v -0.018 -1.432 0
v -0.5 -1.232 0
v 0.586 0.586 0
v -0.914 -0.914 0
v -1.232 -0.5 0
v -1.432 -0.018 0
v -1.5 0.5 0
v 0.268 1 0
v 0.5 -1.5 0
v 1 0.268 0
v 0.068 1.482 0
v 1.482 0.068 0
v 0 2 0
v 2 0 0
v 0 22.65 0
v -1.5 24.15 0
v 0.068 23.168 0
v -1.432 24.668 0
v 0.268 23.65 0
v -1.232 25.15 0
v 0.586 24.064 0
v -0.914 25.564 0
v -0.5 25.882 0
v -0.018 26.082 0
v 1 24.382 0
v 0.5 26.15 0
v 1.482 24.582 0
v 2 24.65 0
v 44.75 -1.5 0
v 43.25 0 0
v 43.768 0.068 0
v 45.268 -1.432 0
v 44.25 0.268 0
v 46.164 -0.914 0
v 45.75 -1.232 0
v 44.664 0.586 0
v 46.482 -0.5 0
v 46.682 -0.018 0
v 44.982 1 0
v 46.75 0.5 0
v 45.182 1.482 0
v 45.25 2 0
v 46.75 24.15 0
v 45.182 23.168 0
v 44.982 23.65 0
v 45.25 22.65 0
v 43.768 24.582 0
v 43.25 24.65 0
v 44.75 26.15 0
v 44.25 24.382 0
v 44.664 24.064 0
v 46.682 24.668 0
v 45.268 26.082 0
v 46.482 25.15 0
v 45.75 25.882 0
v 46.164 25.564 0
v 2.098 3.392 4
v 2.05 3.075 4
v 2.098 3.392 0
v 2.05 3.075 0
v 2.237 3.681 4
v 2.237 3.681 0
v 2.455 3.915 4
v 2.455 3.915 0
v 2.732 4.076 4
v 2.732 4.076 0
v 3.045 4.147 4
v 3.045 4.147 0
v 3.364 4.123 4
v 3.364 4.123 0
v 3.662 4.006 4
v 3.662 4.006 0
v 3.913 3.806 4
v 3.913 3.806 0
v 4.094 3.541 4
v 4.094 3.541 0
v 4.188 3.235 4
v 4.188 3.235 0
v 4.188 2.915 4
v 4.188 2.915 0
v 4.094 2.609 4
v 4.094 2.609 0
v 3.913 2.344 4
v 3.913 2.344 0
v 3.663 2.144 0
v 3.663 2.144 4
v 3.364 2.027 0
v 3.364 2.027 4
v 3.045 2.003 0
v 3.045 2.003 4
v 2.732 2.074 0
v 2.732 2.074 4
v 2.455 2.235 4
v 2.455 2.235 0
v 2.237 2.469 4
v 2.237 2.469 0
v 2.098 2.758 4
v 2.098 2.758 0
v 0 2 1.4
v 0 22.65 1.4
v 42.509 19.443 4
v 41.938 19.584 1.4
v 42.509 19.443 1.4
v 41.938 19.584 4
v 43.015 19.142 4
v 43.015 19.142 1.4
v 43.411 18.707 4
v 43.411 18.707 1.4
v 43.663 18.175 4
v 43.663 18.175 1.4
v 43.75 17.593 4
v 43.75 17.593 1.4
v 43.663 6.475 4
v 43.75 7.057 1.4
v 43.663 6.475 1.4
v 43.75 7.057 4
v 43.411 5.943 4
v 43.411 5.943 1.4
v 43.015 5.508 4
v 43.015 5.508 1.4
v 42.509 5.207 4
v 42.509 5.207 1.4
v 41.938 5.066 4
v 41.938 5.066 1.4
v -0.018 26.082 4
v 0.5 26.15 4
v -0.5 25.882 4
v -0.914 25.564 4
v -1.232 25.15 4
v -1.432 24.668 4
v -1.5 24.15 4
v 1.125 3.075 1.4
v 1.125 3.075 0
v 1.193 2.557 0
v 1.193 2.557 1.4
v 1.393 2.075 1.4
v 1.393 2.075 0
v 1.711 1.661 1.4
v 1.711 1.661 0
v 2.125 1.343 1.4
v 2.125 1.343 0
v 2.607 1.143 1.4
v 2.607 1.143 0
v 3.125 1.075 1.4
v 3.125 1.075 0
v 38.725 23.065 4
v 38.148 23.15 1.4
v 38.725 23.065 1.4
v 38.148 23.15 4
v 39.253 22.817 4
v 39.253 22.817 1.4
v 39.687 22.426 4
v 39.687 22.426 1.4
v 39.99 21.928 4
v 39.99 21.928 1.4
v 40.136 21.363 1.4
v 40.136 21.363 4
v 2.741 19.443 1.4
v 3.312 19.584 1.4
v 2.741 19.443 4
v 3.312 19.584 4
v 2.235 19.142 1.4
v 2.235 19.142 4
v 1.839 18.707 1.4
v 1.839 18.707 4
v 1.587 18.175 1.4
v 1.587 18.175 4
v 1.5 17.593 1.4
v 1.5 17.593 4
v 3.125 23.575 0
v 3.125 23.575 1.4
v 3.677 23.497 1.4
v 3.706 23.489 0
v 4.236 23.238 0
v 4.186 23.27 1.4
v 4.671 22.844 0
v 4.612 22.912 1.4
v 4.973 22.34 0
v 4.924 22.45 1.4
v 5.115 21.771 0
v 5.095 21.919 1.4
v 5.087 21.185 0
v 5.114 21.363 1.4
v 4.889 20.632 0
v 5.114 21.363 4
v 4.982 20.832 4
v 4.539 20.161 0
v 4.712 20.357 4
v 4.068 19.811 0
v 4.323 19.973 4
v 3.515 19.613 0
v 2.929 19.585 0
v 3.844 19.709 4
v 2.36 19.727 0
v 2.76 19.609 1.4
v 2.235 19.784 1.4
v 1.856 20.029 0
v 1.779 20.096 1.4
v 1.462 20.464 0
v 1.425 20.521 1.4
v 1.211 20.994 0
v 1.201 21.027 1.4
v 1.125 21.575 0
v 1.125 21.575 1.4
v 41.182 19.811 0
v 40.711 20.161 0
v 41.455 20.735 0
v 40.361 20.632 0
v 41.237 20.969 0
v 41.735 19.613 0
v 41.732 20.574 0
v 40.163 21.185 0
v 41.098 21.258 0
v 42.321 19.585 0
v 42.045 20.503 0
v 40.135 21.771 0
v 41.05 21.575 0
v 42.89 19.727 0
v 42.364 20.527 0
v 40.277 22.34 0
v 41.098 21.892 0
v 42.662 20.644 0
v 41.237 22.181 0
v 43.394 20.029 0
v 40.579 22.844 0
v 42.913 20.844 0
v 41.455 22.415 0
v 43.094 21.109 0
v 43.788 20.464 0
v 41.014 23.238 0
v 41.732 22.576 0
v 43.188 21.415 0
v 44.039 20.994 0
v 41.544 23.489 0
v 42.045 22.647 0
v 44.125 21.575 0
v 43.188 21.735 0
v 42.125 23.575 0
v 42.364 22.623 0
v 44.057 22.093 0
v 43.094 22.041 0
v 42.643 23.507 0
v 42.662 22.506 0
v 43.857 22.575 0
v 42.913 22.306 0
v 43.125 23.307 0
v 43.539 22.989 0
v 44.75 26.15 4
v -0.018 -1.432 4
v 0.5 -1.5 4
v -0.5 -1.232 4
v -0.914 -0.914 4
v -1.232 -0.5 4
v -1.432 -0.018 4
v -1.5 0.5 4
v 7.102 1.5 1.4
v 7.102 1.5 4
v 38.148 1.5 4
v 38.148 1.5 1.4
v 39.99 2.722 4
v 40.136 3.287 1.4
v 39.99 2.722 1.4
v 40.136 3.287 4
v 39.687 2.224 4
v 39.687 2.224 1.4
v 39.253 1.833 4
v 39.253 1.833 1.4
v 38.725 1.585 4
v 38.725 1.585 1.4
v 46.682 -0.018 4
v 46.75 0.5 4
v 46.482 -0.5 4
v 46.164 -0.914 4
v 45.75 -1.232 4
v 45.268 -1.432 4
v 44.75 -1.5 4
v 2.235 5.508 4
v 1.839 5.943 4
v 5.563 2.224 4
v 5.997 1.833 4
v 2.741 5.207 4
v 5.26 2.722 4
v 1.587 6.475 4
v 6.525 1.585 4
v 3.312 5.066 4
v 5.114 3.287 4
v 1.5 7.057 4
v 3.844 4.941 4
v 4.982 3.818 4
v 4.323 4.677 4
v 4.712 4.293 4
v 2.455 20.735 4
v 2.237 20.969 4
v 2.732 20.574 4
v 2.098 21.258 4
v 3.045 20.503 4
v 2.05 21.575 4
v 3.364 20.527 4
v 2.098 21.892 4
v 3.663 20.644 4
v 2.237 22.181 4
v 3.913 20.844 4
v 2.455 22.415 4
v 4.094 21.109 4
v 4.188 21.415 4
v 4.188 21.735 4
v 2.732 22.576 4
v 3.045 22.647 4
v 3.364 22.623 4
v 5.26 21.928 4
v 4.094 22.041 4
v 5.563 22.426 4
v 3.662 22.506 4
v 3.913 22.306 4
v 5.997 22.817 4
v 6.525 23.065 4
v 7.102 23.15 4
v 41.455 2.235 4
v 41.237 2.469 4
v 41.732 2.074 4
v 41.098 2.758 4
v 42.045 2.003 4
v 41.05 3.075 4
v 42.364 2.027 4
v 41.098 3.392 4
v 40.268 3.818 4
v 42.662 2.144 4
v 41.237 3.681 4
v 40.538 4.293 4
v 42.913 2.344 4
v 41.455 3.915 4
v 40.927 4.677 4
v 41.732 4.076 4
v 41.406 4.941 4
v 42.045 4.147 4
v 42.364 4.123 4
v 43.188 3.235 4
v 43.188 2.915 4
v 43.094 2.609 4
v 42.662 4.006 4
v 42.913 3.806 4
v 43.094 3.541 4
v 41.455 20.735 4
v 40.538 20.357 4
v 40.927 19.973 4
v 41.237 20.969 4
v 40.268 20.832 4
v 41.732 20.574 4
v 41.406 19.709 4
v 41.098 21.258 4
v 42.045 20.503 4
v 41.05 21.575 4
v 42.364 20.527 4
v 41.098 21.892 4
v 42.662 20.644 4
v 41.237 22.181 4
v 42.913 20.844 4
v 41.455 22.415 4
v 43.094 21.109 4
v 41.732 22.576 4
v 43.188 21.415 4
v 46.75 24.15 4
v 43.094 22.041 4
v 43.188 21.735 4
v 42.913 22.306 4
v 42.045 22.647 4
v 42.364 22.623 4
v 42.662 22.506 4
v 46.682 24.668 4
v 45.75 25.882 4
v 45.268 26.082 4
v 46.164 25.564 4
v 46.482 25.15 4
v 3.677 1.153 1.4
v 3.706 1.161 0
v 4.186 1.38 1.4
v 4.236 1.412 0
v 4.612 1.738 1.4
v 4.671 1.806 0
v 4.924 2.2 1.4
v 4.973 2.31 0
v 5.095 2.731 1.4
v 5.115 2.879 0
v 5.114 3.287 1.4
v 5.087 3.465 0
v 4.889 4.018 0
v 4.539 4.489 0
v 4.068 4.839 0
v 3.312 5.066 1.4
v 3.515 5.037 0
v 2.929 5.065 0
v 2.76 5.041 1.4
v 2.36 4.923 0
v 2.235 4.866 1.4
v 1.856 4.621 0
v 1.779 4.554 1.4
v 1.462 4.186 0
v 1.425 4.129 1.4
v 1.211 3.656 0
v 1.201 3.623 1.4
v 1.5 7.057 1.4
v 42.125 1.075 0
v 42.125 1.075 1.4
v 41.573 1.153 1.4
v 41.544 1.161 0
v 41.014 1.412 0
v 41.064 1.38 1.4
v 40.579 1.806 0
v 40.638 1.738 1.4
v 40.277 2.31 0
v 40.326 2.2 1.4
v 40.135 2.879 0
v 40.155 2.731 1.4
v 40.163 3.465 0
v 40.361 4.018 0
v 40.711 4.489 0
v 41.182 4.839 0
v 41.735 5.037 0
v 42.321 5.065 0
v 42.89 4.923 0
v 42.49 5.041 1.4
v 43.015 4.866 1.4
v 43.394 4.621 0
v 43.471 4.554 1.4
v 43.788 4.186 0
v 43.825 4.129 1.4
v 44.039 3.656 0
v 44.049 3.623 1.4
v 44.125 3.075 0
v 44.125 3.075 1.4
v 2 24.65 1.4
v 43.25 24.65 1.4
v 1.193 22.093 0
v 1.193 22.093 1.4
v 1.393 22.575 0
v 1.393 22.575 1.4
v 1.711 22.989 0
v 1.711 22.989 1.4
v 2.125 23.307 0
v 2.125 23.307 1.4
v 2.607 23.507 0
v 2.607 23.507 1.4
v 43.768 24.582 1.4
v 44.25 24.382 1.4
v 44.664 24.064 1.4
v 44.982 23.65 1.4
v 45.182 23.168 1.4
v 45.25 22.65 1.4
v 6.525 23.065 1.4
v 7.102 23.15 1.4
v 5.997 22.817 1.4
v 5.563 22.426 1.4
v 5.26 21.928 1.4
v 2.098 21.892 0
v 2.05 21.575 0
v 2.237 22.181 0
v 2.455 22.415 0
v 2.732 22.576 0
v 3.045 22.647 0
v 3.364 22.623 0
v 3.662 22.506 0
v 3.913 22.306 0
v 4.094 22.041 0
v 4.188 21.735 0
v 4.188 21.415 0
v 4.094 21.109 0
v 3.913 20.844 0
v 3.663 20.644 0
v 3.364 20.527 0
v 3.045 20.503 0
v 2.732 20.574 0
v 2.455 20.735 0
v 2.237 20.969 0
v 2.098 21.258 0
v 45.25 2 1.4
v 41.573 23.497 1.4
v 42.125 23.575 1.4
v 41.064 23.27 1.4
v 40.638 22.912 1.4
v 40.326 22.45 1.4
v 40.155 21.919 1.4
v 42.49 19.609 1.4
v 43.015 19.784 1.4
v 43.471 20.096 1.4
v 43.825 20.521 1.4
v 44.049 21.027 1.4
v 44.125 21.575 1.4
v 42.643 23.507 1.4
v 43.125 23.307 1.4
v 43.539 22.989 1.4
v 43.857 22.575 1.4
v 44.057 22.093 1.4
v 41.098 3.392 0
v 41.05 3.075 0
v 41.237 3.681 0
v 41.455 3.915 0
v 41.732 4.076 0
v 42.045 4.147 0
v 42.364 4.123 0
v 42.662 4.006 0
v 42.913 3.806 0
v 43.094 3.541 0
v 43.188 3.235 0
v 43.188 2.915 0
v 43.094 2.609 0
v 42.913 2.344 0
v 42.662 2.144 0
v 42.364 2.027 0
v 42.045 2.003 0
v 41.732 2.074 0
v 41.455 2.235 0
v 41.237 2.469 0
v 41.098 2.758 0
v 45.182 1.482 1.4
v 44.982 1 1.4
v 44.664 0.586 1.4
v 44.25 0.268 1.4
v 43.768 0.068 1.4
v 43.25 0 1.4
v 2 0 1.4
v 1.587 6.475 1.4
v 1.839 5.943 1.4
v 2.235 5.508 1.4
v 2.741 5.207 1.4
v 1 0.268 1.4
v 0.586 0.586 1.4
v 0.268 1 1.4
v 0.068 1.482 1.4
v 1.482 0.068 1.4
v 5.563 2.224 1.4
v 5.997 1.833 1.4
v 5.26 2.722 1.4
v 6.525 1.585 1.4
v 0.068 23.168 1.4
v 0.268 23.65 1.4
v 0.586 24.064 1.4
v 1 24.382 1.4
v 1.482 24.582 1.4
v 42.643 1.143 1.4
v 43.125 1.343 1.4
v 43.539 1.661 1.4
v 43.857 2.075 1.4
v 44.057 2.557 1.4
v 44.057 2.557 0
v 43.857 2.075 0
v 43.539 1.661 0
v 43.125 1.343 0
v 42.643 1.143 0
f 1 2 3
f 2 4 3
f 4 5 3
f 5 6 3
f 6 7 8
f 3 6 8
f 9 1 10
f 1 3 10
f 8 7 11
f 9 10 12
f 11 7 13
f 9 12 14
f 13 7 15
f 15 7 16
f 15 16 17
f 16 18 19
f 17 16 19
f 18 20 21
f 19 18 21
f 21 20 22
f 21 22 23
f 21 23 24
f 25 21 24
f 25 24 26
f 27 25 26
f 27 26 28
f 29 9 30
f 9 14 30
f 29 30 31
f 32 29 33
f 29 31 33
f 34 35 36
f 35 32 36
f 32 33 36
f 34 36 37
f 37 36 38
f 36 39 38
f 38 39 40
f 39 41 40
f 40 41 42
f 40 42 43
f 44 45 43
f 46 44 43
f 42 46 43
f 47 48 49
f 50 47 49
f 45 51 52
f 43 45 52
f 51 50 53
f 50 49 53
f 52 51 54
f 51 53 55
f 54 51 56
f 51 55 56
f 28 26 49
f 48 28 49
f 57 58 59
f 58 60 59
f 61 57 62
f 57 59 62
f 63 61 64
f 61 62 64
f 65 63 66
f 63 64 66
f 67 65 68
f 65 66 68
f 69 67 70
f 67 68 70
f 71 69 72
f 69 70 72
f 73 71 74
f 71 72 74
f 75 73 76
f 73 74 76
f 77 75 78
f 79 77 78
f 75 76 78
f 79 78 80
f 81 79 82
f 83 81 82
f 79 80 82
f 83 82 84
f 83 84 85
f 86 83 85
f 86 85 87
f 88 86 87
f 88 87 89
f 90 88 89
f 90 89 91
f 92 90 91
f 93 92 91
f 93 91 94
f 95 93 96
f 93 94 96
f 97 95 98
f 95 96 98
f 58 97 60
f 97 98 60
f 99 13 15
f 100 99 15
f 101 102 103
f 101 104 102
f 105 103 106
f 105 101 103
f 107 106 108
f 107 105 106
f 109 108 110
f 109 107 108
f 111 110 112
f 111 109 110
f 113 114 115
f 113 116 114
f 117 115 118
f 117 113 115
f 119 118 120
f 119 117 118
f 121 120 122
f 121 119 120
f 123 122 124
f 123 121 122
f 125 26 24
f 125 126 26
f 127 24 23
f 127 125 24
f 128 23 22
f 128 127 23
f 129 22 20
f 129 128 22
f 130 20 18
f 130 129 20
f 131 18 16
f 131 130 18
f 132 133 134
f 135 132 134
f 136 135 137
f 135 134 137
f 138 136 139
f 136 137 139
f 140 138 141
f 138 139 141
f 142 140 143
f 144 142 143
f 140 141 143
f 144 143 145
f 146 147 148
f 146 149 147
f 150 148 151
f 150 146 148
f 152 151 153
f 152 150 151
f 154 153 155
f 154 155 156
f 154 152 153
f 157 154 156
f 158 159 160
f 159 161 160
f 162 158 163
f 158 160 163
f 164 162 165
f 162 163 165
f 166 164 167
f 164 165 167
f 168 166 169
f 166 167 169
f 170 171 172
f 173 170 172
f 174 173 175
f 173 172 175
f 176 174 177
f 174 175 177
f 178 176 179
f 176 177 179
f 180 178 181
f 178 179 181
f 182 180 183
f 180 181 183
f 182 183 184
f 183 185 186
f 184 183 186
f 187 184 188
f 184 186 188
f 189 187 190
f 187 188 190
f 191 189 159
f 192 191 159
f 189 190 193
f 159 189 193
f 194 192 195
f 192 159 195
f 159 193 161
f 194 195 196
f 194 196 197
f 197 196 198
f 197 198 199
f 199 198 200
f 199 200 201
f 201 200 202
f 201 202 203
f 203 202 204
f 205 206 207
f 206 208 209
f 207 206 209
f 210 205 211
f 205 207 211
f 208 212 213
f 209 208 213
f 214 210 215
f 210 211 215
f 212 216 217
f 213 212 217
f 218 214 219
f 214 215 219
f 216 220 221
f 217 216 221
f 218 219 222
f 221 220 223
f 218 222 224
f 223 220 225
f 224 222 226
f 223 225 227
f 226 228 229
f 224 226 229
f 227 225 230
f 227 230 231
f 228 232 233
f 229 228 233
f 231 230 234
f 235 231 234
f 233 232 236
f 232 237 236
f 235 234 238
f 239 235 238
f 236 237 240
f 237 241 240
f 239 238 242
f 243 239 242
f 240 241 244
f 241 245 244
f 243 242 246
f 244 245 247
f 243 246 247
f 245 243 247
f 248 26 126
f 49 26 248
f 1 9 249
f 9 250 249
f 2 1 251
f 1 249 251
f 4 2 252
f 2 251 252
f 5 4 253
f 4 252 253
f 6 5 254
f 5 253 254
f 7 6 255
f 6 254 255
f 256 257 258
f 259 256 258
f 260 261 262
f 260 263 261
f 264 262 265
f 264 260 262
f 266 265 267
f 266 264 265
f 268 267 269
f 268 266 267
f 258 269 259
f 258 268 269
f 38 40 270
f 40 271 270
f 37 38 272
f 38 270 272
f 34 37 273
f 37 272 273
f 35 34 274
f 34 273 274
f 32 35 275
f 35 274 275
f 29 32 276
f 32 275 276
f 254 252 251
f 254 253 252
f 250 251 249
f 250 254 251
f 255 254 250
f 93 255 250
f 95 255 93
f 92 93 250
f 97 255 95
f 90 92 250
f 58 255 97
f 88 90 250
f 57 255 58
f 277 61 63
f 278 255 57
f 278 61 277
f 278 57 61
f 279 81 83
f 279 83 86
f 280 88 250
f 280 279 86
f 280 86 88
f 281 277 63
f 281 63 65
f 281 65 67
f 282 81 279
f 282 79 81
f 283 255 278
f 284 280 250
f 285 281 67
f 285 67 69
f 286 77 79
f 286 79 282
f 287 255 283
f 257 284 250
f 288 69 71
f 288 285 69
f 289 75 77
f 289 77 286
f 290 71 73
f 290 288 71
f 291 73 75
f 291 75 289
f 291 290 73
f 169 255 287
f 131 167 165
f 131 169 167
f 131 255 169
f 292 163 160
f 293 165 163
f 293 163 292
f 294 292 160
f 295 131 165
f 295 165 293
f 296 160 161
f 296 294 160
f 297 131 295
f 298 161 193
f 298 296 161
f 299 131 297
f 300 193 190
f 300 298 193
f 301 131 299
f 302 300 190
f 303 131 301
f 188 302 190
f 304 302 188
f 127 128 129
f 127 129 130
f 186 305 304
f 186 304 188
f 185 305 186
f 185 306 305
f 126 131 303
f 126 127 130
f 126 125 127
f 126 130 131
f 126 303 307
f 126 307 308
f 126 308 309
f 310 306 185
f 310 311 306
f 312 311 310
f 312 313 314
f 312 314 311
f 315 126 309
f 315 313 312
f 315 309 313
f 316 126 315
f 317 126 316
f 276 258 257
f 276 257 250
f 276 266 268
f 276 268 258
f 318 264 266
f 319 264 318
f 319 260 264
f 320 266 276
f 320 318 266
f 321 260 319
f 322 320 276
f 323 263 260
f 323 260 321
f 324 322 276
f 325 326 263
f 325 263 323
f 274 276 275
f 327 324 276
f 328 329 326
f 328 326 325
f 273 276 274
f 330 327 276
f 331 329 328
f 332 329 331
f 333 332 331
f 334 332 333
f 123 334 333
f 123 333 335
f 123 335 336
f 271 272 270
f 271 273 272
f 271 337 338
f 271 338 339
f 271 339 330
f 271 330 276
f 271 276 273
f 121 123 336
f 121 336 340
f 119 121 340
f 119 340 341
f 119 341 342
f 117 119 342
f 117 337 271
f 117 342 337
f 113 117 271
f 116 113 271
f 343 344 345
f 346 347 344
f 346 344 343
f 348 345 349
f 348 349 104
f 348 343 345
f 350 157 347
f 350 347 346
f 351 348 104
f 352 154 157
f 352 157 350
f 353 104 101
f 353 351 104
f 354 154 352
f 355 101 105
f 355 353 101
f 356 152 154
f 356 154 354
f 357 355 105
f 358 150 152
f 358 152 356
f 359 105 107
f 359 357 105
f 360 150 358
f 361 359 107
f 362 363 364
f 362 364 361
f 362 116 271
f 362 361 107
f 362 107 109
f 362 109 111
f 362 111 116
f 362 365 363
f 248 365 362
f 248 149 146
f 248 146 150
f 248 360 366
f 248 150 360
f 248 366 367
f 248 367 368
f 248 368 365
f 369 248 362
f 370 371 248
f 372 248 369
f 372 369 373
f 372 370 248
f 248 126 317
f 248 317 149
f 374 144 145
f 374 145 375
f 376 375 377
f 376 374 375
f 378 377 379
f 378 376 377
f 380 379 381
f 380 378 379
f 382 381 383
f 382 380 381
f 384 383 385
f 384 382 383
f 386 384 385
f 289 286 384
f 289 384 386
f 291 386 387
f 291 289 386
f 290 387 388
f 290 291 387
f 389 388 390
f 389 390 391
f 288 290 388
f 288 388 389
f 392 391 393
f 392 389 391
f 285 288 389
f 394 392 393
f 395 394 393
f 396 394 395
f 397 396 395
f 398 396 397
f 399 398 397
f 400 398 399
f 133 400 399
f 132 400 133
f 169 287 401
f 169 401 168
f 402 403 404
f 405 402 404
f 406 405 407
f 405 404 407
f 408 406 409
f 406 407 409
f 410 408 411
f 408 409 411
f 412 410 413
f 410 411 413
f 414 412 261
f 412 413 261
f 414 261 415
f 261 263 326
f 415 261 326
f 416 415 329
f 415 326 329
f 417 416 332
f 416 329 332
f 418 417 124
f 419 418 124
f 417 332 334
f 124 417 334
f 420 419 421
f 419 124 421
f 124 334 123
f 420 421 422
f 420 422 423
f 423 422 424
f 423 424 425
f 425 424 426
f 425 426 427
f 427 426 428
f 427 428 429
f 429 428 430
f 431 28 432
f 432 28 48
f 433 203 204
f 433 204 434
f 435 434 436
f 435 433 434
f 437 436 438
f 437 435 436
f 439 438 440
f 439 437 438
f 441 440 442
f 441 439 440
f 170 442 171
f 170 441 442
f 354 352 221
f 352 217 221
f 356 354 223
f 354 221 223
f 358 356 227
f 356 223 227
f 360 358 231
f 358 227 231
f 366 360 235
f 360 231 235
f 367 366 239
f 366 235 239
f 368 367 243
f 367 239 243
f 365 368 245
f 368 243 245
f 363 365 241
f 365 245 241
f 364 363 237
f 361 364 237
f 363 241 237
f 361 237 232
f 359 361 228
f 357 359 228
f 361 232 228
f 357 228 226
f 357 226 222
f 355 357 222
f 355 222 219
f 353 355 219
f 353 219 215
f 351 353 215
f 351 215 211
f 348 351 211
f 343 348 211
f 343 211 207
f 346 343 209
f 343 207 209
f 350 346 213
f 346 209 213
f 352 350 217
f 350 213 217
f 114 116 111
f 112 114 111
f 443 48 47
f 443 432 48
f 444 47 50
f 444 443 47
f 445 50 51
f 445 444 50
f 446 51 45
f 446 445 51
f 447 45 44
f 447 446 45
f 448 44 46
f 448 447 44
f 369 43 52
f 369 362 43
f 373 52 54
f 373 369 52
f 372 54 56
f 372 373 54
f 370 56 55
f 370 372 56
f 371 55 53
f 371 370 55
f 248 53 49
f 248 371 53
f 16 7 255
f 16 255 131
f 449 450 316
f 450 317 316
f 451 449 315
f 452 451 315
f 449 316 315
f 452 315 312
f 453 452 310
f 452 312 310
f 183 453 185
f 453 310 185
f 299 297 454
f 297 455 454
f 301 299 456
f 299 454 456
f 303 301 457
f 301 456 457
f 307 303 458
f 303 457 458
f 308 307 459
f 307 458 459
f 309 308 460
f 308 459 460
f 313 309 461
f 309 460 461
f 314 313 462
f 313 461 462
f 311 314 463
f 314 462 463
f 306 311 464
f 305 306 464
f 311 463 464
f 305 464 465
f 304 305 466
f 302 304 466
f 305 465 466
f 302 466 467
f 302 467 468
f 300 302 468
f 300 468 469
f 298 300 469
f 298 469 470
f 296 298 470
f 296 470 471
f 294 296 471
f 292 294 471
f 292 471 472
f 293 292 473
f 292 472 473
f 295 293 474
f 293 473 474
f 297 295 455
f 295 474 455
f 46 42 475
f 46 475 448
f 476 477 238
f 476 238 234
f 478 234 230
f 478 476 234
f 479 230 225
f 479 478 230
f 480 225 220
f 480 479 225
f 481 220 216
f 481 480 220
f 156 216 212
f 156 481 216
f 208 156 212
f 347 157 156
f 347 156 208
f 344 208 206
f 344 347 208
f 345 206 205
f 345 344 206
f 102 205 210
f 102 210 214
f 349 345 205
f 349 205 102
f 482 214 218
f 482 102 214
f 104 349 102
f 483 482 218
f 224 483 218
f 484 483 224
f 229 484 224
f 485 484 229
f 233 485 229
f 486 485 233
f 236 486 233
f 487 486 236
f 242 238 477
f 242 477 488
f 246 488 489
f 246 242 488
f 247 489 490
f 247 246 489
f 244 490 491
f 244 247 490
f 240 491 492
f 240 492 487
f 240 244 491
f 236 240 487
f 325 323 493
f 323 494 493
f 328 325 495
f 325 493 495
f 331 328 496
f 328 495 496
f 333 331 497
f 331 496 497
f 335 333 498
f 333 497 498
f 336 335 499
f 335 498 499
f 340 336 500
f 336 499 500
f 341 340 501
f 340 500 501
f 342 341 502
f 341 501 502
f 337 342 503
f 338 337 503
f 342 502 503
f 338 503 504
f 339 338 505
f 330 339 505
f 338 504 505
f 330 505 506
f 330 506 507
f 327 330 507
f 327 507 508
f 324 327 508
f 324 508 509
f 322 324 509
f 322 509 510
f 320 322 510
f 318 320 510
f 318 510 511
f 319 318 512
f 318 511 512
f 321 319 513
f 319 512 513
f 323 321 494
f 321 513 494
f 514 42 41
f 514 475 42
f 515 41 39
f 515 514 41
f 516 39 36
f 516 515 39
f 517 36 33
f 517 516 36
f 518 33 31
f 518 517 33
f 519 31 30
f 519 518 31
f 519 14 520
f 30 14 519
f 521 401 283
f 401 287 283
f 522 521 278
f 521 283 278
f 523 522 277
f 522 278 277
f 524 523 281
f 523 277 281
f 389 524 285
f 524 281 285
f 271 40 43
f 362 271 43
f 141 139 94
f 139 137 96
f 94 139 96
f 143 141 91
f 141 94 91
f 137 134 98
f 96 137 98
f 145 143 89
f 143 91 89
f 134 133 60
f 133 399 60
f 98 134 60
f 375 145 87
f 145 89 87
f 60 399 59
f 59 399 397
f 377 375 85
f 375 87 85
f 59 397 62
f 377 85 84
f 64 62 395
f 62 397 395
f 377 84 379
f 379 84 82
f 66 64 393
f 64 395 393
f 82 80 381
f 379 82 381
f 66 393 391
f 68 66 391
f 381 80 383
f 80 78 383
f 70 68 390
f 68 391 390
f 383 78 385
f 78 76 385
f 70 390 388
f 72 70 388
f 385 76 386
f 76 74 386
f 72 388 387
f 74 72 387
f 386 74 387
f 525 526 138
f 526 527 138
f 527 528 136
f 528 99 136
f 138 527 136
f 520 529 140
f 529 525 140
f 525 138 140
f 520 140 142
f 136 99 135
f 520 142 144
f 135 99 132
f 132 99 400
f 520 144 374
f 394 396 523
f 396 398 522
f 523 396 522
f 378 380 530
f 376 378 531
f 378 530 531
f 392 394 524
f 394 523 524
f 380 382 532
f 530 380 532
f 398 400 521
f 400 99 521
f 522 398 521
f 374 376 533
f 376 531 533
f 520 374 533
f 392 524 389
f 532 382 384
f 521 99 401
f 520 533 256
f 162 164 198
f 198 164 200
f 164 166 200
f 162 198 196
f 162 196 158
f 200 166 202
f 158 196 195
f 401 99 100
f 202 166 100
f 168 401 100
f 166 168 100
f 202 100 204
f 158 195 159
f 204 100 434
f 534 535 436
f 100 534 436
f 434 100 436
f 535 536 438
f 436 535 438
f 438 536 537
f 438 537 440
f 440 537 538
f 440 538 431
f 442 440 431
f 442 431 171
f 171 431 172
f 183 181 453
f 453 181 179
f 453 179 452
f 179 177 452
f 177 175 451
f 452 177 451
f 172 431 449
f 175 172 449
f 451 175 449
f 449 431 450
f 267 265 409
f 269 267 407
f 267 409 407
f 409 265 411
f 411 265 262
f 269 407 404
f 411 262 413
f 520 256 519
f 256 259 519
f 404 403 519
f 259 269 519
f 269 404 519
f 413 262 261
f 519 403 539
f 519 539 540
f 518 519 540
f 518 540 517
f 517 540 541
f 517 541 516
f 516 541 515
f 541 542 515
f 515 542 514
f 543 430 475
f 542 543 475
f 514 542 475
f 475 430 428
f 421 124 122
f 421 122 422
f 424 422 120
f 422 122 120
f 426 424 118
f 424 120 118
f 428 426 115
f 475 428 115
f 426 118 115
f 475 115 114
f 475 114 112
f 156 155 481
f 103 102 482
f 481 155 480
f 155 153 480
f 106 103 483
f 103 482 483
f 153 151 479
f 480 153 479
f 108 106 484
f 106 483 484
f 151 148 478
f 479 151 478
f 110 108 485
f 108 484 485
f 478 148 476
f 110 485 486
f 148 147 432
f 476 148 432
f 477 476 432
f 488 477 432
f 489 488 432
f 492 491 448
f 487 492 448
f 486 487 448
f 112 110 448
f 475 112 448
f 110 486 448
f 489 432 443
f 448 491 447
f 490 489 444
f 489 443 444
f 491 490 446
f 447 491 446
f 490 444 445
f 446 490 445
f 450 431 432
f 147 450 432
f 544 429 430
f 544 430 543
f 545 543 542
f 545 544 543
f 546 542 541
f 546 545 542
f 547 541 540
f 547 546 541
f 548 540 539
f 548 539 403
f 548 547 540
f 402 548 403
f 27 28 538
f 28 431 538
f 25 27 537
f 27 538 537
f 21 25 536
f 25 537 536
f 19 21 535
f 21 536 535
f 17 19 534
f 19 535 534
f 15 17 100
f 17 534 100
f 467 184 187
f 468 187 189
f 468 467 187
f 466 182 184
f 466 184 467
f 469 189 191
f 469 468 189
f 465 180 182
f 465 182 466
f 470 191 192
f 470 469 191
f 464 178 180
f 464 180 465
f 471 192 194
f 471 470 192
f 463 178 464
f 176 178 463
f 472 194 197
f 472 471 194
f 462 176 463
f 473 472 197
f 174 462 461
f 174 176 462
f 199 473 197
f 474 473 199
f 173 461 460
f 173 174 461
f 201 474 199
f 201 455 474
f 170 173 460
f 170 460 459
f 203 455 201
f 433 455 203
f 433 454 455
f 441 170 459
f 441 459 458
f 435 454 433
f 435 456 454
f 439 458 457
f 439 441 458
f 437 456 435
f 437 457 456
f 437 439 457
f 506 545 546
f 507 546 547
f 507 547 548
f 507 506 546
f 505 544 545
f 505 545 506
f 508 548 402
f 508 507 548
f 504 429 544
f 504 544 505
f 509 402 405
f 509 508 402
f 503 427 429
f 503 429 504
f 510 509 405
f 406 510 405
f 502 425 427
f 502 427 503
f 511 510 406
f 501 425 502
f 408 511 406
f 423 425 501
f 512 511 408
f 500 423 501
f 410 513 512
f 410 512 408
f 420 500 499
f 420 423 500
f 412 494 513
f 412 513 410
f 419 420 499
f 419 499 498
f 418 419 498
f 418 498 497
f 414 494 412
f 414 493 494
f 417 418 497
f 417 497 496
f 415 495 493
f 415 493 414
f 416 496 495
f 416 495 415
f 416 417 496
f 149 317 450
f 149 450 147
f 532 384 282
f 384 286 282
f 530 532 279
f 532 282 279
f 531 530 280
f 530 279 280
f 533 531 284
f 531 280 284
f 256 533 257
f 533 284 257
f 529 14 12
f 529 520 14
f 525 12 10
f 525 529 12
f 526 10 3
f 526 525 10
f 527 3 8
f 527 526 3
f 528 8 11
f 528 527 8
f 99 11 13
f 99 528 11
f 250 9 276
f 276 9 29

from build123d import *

# Parameters (mm, degrees)
SKETCH1_W           = 48.25
SKETCH1_H           = 27.65
SKETCH1_W_2         = 45.25
SKETCH1_H_2         = 24.65
MAIN_BODY_DEPTH     = 4
SKETCH3_W           = 45.25
SKETCH3_H           = 24.65
SKETCH3_W_2         = 42.25
SKETCH3_H_2         = 21.65
BOSS_EXTRUDE2_DEPTH = 2.6
BOSS_EXTRUDE3_START = -2.6
BOSS_EXTRUDE3_DEPTH = 4
SKETCH5_R           = 1.075
CUT_EXTRUDE1_DEPTH  = 1.4
SKETCH6_R           = 1.075
CUT_EXTRUDE2_DEPTH  = 3.6
FILLET1_R           = 2


with BuildPart() as part:
    # Sketch1 → Main Body (new body)
    with BuildSketch(Plane.XY):
        with Locations((22.625, 12.325)):
            Rectangle(SKETCH1_W, SKETCH1_H)
        with Locations((22.625, 12.325)):
            Rectangle(SKETCH1_W_2, SKETCH1_H_2, mode=Mode.SUBTRACT)
    extrude(amount=MAIN_BODY_DEPTH)

    # Sketch3 → Boss-Extrude2 (add)
    with BuildSketch(Plane.XY.offset(4)):
        with Locations((22.625, 12.325)):
            Rectangle(SKETCH3_W, SKETCH3_H)
        with Locations((22.625, 12.325)):
            Rectangle(SKETCH3_W_2, SKETCH3_H_2, mode=Mode.SUBTRACT)
    extrude(amount=-BOSS_EXTRUDE2_DEPTH)

    # Sketch4 → Boss-Extrude3 (add)
    with BuildSketch(Plane(origin=(0, 0, 1.4), x_dir=(-1, 0, 0), z_dir=(0, 0, -1)).offset(BOSS_EXTRUDE3_START)):
        with BuildLine():
            Line((-1.125, 21.575), (-1.125, 23.575))
            Line((-1.125, 23.575), (-3.125, 23.575))
            ThreePointArc((-3.125, 23.575), (-4.539213562, 20.160786438), (-1.125, 21.575))
        make_face()
        with BuildLine():
            Line((-1.125, 1.075), (-3.125, 1.075))
            ThreePointArc((-3.125, 1.075), (-4.539213562, 4.489213562), (-1.125, 3.075))
            Line((-1.125, 3.075), (-1.125, 1.075))
        make_face()
        with BuildLine():
            Line((-44.125, 3.075), (-44.125, 1.075))
            Line((-44.125, 1.075), (-42.125, 1.075))
            ThreePointArc((-42.125, 1.075), (-40.710786438, 4.489213562), (-44.125, 3.075))
        make_face()
        with BuildLine():
            Line((-44.125, 23.575), (-42.125, 23.575))
            ThreePointArc((-42.125, 23.575), (-40.710786438, 20.160786438), (-44.125, 21.575))
            Line((-44.125, 21.575), (-44.125, 23.575))
        make_face()
    extrude(amount=BOSS_EXTRUDE3_DEPTH)

    # Sketch5 → Cut-Extrude1 (cut)
    with BuildSketch(Plane(origin=(0, 0, 0), x_dir=(-1, 0, 0), z_dir=(0, 0, -1))):
        with BuildLine():
            ThreePointArc((-1.125, 21.575), (-1.710786438, 22.989213562), (-3.125, 23.575))
            Line((-3.125, 23.575), (-1.125, 23.575))
            Line((-1.125, 23.575), (-1.125, 21.575))
        make_face()
        with Locations((-3.125, 21.575)):
            Circle(SKETCH5_R)
        with Locations((-3.125, 3.075)):
            Circle(SKETCH5_R)
        with BuildLine():
            Line((-1.125, 1.075), (-1.125, 3.075))
            ThreePointArc((-1.125, 3.075), (-1.710786438, 1.660786438), (-3.125, 1.075))
            Line((-3.125, 1.075), (-1.125, 1.075))
        make_face()
        with Locations((-42.125, 3.075)):
            Circle(SKETCH5_R)
        with BuildLine():
            ThreePointArc((-44.125, 3.075), (-43.539213562, 1.660786438), (-42.125, 1.075))
            Line((-42.125, 1.075), (-44.125, 1.075))
            Line((-44.125, 1.075), (-44.125, 3.075))
        make_face()
        with Locations((-42.125, 21.575)):
            Circle(SKETCH5_R)
        with BuildLine():
            ThreePointArc((-42.125, 23.575), (-43.539213562, 22.989213562), (-44.125, 21.575))
            Line((-44.125, 21.575), (-44.125, 23.575))
            Line((-44.125, 23.575), (-42.125, 23.575))
        make_face()
    extrude(amount=-CUT_EXTRUDE1_DEPTH, mode=Mode.SUBTRACT)

    # Sketch6 → Cut-Extrude2 (cut, through all)
    with BuildSketch(Plane(origin=(0, 0, 1.4), x_dir=(-1, 0, 0), z_dir=(0, 0, -1))):
        with Locations((-3.125, 21.575)):
            Circle(SKETCH6_R)
        with Locations((-3.125, 3.075)):
            Circle(SKETCH6_R)
        with Locations((-42.125, 3.075)):
            Circle(SKETCH6_R)
        with Locations((-42.125, 21.575)):
            Circle(SKETCH6_R)
    extrude(amount=-CUT_EXTRUDE2_DEPTH, mode=Mode.SUBTRACT)

    # Fillet1
    fillet1_edges = [part.edges().sort_by_distance(p)[0] for p in [
        (43.75, 20.409077618, 2.7),
        (40.892370696, 23.15, 2.7),
        (45.25, 24.65, 0.7),
        (0, 24.65, 0.7),
        (45.25, 0, 0.7),
        (0, 0, 0.7),
        (4.357629304, 1.5, 2.7),
        (1.5, 4.240922382, 2.7),
        (43.75, 4.240922382, 2.7),
        (-1.5, 26.15, 2),
        (46.75, 26.15, 2),
        (40.892370696, 1.5, 2.7),
        (46.75, -1.5, 2),
        (-1.5, -1.5, 2),
        (4.357629304, 23.15, 2.7),
        (1.5, 20.409077618, 2.7),
    ]]
    fillet(fillet1_edges, radius=FILLET1_R)


solid = part.part
